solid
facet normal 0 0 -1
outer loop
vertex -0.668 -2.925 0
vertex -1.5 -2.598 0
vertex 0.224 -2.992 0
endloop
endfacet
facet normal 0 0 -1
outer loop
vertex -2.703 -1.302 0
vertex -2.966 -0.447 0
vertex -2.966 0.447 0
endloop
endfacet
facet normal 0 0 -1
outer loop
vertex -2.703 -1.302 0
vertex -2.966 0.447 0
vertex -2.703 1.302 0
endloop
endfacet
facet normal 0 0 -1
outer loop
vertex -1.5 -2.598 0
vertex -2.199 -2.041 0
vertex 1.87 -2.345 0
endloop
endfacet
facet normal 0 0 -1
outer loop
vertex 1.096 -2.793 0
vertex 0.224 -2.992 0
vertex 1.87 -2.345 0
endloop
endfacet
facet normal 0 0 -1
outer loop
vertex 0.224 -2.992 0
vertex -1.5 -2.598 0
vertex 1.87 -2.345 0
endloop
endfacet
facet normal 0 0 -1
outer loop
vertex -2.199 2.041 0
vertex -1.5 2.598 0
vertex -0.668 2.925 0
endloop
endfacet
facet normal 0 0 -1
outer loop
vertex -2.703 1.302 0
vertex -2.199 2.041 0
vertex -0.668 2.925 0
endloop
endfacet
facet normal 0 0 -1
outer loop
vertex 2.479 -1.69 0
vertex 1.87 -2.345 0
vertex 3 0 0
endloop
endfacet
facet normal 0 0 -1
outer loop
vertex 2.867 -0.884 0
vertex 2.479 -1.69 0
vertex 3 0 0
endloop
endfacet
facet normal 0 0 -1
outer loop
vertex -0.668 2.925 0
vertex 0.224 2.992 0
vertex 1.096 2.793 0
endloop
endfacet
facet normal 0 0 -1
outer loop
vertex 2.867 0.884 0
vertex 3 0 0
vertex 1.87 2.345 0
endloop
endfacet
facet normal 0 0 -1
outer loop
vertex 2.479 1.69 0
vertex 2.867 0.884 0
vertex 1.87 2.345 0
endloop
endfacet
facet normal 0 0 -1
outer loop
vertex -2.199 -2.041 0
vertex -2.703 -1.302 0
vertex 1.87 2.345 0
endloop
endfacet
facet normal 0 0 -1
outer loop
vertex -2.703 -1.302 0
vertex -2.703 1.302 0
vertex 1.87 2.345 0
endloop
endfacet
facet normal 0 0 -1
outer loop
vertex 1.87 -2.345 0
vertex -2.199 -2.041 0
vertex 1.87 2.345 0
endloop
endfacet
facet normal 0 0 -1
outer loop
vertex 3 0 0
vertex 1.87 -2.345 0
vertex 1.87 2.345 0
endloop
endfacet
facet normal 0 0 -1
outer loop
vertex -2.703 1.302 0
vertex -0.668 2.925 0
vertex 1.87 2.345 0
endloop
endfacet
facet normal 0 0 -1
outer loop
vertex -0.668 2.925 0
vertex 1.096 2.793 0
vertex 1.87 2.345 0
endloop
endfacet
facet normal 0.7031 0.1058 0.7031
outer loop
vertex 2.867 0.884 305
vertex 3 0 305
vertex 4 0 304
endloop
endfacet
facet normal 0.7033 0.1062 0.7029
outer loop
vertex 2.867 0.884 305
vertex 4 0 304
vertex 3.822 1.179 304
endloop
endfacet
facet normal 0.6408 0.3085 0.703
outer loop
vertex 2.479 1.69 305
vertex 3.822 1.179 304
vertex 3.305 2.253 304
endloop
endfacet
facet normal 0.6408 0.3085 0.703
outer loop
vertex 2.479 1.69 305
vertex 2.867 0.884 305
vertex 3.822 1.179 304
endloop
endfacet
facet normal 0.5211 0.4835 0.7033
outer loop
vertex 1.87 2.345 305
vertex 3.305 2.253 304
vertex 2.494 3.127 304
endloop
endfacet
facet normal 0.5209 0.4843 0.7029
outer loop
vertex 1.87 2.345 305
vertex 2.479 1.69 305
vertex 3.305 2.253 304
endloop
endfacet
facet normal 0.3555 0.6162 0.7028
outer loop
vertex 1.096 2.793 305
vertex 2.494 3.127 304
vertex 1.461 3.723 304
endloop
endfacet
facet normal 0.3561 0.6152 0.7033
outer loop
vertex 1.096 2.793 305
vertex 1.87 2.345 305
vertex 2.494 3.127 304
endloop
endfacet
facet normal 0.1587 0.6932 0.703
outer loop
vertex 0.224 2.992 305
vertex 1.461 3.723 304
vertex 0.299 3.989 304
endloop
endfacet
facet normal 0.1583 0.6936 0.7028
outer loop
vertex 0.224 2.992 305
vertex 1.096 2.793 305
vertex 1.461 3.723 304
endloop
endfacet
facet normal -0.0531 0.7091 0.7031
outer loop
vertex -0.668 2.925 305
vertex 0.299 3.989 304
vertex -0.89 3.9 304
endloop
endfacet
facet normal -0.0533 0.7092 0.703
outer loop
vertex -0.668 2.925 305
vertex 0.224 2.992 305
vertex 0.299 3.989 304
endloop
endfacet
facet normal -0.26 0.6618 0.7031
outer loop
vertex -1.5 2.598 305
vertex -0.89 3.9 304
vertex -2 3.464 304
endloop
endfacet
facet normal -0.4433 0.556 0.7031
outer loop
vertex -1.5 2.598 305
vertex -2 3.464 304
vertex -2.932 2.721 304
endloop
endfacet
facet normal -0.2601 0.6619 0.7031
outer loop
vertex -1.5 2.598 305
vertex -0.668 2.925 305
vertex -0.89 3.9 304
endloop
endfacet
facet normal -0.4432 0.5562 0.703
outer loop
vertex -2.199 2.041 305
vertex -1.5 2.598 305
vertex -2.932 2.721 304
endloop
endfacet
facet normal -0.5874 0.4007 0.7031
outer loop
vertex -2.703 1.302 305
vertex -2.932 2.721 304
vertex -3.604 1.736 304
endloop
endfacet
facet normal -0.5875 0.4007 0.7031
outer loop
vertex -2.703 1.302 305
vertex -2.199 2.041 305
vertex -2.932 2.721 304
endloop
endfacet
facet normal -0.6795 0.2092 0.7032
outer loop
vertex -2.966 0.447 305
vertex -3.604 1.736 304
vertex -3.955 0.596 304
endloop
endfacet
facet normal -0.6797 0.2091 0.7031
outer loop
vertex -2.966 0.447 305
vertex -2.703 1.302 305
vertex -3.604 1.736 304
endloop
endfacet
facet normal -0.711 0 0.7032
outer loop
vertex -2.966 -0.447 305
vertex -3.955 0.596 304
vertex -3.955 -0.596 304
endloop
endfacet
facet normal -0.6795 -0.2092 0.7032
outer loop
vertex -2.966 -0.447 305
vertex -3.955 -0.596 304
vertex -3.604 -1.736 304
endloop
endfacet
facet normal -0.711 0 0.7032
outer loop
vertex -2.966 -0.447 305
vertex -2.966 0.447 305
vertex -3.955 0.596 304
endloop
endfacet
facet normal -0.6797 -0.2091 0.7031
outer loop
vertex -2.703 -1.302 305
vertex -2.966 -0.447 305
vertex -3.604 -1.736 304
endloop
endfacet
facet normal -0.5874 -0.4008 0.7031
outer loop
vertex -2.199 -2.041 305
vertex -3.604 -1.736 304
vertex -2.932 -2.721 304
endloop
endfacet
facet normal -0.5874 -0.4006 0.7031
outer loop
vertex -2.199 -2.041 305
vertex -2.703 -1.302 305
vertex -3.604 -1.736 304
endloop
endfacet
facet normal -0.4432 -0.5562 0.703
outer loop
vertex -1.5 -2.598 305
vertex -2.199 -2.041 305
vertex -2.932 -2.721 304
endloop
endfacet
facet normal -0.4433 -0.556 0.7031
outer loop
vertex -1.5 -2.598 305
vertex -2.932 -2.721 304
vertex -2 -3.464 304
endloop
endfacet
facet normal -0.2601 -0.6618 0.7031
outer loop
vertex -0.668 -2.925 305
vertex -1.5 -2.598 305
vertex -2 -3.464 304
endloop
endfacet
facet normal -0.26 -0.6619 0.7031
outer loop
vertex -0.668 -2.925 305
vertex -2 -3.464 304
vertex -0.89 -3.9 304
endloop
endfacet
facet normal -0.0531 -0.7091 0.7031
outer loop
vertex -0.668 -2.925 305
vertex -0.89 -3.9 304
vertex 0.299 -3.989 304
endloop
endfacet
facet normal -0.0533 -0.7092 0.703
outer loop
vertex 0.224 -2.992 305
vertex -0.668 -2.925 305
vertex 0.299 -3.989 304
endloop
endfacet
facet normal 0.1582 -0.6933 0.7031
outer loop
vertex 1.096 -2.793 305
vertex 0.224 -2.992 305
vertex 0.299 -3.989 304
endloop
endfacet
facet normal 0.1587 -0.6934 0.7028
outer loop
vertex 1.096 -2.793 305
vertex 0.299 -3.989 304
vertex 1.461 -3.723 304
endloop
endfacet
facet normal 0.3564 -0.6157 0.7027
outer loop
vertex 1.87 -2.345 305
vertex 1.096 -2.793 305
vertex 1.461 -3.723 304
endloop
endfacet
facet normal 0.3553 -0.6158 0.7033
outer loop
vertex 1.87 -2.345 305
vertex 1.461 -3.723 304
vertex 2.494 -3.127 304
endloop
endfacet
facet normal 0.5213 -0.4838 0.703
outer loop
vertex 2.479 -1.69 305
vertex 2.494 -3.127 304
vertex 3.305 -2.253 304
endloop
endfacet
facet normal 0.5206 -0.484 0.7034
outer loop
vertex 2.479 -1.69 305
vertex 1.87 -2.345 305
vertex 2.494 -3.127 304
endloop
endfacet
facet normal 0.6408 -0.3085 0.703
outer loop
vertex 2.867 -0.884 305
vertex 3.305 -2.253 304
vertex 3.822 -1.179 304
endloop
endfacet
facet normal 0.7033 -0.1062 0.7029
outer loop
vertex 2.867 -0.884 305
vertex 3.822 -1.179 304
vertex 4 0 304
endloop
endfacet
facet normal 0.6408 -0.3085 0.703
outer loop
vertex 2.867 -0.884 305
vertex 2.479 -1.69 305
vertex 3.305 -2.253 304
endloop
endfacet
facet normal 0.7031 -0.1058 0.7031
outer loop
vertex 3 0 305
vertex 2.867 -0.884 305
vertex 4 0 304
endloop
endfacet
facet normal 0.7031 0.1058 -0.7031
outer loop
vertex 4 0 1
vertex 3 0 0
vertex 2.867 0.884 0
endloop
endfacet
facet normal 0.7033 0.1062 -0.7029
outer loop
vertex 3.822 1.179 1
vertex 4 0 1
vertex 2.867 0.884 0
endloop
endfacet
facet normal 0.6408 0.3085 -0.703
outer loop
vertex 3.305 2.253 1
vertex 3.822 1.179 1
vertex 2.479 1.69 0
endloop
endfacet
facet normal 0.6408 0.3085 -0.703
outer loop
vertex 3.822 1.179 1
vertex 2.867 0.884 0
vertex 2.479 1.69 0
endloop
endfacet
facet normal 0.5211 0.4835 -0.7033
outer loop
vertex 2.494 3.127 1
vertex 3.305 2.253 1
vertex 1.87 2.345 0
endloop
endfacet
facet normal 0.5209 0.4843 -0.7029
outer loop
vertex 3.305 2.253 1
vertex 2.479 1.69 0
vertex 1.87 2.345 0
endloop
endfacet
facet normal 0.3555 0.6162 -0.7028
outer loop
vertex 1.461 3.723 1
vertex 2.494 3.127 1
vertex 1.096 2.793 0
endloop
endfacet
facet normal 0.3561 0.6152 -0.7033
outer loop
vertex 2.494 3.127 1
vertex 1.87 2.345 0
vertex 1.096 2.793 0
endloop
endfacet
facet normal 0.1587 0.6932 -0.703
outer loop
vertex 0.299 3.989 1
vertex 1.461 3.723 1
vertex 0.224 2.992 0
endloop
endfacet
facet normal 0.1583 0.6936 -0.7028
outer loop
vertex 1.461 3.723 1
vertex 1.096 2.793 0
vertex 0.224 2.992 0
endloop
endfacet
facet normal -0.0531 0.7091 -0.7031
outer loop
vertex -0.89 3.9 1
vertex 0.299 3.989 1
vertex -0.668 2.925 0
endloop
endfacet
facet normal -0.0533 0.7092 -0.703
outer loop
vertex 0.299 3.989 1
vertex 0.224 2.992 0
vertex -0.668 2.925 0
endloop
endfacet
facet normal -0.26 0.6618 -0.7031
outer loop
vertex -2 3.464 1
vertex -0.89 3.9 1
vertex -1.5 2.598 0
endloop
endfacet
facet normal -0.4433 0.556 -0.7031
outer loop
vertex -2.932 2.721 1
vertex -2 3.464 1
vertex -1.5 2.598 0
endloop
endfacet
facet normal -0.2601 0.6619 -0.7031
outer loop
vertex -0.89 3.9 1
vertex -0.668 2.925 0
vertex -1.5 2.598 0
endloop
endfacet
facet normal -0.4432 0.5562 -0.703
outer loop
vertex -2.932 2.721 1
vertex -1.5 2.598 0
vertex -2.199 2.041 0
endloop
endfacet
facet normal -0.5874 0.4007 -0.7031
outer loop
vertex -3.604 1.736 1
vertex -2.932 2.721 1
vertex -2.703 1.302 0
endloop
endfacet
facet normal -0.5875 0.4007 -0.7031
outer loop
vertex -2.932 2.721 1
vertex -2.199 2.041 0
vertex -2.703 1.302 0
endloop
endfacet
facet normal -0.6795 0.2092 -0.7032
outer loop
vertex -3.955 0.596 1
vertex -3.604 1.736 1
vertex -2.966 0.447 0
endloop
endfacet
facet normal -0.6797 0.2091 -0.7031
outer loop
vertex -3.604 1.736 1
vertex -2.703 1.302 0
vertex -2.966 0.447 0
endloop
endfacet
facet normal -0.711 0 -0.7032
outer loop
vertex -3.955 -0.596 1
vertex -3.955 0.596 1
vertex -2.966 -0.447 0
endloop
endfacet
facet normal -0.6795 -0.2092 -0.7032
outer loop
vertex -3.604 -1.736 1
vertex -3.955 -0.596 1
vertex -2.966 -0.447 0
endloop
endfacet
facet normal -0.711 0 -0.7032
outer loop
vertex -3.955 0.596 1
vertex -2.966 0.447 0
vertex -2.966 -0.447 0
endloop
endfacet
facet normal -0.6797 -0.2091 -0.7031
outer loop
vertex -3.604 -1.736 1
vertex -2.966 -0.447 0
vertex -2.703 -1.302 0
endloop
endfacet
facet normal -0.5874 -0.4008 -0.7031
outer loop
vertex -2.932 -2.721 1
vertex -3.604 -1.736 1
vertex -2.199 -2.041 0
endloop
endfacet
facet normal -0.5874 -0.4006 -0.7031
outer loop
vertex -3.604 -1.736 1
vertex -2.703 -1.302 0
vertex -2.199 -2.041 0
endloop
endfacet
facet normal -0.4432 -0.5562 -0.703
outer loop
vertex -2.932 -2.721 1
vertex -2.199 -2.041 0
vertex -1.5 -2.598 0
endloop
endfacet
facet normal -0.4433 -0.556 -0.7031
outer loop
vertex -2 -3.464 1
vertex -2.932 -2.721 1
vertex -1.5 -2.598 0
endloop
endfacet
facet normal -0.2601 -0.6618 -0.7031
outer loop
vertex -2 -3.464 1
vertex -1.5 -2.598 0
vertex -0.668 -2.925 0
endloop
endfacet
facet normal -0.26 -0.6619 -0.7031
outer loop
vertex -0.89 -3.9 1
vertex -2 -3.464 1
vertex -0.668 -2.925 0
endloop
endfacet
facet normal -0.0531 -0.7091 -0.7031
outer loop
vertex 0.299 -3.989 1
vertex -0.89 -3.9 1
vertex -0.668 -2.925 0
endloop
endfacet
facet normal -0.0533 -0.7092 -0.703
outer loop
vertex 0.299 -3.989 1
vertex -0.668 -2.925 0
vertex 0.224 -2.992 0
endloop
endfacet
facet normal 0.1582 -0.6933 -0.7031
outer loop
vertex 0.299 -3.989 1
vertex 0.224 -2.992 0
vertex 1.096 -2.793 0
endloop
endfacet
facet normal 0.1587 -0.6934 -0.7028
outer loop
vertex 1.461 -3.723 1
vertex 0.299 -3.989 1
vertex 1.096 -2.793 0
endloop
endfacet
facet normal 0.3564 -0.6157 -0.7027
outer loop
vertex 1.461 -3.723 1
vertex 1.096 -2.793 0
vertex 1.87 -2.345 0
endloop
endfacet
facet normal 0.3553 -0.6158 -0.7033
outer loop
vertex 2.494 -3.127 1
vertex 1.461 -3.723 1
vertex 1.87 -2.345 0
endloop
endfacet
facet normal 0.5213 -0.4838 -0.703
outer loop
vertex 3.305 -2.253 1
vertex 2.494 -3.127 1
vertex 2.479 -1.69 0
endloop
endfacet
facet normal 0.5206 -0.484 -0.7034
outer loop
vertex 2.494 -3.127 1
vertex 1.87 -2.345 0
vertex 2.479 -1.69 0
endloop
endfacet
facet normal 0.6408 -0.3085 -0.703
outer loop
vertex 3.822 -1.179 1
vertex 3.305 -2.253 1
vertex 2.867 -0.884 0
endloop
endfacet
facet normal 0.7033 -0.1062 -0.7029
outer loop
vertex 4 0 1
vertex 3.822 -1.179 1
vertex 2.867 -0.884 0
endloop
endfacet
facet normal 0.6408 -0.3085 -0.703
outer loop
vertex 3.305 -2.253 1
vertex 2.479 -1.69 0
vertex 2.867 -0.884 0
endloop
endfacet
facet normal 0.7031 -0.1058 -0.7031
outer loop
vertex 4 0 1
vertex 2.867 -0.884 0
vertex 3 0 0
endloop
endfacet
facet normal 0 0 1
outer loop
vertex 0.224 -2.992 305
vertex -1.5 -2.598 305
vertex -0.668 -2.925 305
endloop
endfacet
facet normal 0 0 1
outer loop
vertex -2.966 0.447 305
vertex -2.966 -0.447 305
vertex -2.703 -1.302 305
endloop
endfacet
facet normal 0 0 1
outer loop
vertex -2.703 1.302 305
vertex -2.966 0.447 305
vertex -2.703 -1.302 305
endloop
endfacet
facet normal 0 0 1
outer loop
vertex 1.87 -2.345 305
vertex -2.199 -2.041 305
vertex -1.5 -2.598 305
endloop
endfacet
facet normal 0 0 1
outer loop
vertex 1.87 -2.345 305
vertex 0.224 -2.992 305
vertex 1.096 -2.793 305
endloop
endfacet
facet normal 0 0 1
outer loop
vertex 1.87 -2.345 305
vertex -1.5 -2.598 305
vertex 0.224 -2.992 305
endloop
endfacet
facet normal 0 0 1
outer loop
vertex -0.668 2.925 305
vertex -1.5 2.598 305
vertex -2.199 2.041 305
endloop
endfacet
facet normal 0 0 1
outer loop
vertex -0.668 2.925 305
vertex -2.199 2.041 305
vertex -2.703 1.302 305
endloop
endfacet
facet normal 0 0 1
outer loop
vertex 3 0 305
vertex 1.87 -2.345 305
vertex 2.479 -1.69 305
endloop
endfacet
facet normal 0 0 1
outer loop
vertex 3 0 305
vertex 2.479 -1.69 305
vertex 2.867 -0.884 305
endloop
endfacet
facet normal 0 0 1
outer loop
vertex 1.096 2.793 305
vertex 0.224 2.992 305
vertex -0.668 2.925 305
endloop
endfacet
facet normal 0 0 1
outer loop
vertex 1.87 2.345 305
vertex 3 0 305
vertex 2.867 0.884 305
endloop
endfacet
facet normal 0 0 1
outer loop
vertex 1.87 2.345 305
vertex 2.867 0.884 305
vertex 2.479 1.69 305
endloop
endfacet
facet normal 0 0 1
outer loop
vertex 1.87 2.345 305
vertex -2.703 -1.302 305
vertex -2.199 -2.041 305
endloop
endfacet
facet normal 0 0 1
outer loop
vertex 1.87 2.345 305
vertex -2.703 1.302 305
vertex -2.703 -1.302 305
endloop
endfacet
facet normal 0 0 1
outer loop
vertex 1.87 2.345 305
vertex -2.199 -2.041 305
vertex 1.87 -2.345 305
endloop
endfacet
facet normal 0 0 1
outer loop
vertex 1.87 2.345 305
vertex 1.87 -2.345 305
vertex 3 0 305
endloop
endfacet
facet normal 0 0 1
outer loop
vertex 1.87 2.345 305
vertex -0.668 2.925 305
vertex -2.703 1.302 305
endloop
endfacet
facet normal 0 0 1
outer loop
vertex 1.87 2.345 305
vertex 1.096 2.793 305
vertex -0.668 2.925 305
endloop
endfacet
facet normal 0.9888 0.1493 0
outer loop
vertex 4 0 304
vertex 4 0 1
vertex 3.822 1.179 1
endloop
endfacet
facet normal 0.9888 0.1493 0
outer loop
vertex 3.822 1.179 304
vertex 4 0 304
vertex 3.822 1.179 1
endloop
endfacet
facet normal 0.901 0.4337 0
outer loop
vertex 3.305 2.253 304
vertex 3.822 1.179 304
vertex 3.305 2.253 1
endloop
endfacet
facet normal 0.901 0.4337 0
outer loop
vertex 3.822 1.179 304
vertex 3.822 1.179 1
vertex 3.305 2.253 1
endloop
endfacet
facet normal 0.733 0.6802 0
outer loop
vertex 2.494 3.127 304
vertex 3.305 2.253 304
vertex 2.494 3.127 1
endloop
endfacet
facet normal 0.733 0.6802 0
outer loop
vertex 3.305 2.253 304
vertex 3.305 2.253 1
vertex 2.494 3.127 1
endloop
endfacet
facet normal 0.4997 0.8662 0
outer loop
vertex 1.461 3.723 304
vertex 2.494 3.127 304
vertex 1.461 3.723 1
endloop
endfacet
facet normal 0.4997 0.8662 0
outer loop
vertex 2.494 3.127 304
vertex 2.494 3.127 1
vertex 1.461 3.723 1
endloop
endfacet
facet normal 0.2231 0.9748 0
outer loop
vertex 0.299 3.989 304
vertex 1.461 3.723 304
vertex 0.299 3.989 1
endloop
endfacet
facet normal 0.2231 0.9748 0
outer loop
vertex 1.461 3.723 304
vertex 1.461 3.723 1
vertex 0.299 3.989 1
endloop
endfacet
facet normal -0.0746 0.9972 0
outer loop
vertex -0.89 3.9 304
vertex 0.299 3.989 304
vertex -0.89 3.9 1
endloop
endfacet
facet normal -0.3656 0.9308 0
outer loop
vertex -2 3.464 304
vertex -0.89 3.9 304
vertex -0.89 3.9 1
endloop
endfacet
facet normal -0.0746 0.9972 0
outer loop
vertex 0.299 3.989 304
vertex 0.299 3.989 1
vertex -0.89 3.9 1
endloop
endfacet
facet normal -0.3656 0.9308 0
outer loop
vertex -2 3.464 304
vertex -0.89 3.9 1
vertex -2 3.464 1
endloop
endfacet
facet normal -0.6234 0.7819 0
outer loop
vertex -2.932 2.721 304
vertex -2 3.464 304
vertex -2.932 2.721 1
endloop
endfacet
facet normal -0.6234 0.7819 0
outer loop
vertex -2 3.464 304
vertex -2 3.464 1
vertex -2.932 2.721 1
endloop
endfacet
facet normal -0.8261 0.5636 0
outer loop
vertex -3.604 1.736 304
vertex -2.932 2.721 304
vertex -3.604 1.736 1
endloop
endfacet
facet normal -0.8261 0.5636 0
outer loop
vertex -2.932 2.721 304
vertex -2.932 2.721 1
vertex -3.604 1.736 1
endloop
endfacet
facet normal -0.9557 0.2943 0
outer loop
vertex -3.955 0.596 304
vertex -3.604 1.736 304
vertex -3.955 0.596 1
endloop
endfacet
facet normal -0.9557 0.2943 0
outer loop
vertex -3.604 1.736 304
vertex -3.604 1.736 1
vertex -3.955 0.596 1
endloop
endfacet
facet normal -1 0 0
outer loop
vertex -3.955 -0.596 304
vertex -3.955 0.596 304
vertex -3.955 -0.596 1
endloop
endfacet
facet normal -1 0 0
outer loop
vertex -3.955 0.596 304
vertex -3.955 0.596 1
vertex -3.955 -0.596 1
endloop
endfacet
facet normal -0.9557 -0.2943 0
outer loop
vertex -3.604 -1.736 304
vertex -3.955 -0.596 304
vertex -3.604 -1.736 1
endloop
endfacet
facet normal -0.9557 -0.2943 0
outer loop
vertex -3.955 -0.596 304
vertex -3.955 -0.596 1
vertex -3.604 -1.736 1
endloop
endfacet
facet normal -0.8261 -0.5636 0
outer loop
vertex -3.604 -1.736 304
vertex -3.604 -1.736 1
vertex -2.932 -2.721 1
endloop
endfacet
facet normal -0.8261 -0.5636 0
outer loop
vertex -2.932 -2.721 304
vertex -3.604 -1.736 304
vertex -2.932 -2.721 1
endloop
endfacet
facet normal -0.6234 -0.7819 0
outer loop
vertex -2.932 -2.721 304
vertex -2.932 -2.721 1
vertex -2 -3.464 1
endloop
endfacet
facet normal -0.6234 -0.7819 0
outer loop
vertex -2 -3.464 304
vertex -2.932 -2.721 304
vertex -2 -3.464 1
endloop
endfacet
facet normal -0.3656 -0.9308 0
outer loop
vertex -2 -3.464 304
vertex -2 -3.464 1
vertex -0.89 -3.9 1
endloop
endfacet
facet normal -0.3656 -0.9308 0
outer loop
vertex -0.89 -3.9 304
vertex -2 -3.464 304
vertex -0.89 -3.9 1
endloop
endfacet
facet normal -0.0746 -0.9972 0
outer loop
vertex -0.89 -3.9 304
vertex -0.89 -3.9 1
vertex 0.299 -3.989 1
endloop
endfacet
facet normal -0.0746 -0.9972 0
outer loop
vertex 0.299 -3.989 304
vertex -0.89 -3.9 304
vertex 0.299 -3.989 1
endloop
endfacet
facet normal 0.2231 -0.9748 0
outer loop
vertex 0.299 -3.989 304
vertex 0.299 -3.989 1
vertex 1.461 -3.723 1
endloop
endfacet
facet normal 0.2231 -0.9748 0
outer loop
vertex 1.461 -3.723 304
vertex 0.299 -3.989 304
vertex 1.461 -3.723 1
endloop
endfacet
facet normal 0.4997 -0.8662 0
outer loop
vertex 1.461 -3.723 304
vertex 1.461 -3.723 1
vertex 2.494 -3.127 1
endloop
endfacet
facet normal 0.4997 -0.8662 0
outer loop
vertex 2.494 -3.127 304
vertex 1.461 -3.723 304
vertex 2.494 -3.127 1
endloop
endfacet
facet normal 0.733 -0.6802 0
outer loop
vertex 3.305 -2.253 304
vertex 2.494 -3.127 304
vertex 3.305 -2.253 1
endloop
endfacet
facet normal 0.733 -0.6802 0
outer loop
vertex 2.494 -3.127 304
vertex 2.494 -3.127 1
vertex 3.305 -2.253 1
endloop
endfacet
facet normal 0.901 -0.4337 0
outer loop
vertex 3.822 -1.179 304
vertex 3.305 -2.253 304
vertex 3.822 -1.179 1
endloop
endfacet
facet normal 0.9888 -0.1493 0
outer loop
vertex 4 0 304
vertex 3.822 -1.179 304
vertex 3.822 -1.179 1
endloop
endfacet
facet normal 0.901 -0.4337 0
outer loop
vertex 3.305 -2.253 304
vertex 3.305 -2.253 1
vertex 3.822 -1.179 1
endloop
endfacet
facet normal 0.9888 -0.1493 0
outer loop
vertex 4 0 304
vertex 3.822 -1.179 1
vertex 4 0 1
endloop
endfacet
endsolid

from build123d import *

# Parameters (mm, degrees)
SKETCH1_R           = 4
BOSS_EXTRUDE1_DEPTH = 305
CHAMFER2_SIZE       = 1
CHAMFER3_SIZE       = 1


with BuildPart() as part:
    # Sketch1 → Boss-Extrude1 (new body)
    with BuildSketch(Plane.XY):
        Circle(SKETCH1_R)
    extrude(amount=BOSS_EXTRUDE1_DEPTH)

    # Chamfer2
    chamfer2_edges = [part.edges().sort_by_distance(p)[0] for p in [
        (-4, 0, 0),
    ]]
    chamfer(chamfer2_edges, length=CHAMFER2_SIZE)

    # Chamfer3
    chamfer3_edges = [part.edges().sort_by_distance(p)[0] for p in [
        (-4, 0, 305),
    ]]
    chamfer(chamfer3_edges, length=CHAMFER3_SIZE)


solid = part.part
